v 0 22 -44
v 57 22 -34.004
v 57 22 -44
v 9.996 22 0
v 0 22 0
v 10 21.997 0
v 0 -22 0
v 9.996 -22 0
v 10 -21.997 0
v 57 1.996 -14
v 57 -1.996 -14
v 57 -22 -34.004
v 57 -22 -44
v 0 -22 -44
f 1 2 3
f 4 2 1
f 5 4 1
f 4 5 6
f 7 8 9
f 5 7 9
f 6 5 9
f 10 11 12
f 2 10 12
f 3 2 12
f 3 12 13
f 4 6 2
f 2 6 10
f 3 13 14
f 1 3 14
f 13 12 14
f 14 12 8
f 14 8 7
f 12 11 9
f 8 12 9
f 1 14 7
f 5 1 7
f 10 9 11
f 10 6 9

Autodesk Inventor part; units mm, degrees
ref_plane "YZ Plane" through (0, 0, 0) normal (1, 0, 0) x (0, 1, 0)
ref_plane "XZ Plane" through (0, 0, 0) normal (0, 1, 0) x (-1, 0, 0)
sketch "草圖1" plane through (0, 0, 0) normal (0, 1, 0) x (-1, 0, 0)
  line L0 (0, 0) -> (-57, 0)
  line L1 (-57, 0) -> (-57, -44)
  line L2 (-57, -44) -> (0, -44)
  line L3 (0, -44) -> (0, 0)
  dimension "d0" = 57
  dimension "d1" = 44
extrude "擠出1" add sketch "草圖1" along normal mid plane 44
sketch "草圖2" plane through (0, 22, 0) normal (0, 1, 0) x (1, 0, 0)
  line L0 (0, 0) -> (57, 0) projected
  line L1 (10, 0) -> (57, 14)
  line L2 (57, 0) -> (57, 44) projected
  dimension "d4" = 10
  dimension "d5" = 30
extrude "擠出2" cut sketch "草圖2" against normal blind 60
sketch "草圖3" plane through (57, -22, -44) normal (1, 0, 0) x (0, 0, -1)
  line L0 (-30, 24) -> (-10, 44)
  line L1 (0, 44) -> (-44, 44) projected
  line L2 (-30, 44) -> (-30, 0) projected
  point P0 (-44, 22)
  point P1 (-30, 2)
  dimension "d8" = 20
  dimension "d9" = 20
ref_plane "工作平面1" through (10, 22, 0) normal (-0.4554, -0.6295, -0.6295) x (0.8102, 0, -0.5861)
sketch "草圖4" plane through (10, 22, 0) normal (-0.4554, -0.6295, -0.6295) x (0.8102, 0, -0.5861)
  line L0 (-15.1543, -12.3218) -> (93.717, -12.3218)
  line L1 (93.717, -12.3218) -> (93.717, 28.8166)
  line L2 (93.717, 28.8166) -> (-15.1543, 28.8166)
  line L3 (-15.1543, 28.8166) -> (-15.1543, -12.3218)
  point P0 (-8.1022, 13.4037)
extrude "擠出3" cut sketch "草圖4" against normal blind 40
mirror "鏡射1" about plane through (0, 0, 0) normal (0, 1, 0) of "擠出3"
properties part number "62"
